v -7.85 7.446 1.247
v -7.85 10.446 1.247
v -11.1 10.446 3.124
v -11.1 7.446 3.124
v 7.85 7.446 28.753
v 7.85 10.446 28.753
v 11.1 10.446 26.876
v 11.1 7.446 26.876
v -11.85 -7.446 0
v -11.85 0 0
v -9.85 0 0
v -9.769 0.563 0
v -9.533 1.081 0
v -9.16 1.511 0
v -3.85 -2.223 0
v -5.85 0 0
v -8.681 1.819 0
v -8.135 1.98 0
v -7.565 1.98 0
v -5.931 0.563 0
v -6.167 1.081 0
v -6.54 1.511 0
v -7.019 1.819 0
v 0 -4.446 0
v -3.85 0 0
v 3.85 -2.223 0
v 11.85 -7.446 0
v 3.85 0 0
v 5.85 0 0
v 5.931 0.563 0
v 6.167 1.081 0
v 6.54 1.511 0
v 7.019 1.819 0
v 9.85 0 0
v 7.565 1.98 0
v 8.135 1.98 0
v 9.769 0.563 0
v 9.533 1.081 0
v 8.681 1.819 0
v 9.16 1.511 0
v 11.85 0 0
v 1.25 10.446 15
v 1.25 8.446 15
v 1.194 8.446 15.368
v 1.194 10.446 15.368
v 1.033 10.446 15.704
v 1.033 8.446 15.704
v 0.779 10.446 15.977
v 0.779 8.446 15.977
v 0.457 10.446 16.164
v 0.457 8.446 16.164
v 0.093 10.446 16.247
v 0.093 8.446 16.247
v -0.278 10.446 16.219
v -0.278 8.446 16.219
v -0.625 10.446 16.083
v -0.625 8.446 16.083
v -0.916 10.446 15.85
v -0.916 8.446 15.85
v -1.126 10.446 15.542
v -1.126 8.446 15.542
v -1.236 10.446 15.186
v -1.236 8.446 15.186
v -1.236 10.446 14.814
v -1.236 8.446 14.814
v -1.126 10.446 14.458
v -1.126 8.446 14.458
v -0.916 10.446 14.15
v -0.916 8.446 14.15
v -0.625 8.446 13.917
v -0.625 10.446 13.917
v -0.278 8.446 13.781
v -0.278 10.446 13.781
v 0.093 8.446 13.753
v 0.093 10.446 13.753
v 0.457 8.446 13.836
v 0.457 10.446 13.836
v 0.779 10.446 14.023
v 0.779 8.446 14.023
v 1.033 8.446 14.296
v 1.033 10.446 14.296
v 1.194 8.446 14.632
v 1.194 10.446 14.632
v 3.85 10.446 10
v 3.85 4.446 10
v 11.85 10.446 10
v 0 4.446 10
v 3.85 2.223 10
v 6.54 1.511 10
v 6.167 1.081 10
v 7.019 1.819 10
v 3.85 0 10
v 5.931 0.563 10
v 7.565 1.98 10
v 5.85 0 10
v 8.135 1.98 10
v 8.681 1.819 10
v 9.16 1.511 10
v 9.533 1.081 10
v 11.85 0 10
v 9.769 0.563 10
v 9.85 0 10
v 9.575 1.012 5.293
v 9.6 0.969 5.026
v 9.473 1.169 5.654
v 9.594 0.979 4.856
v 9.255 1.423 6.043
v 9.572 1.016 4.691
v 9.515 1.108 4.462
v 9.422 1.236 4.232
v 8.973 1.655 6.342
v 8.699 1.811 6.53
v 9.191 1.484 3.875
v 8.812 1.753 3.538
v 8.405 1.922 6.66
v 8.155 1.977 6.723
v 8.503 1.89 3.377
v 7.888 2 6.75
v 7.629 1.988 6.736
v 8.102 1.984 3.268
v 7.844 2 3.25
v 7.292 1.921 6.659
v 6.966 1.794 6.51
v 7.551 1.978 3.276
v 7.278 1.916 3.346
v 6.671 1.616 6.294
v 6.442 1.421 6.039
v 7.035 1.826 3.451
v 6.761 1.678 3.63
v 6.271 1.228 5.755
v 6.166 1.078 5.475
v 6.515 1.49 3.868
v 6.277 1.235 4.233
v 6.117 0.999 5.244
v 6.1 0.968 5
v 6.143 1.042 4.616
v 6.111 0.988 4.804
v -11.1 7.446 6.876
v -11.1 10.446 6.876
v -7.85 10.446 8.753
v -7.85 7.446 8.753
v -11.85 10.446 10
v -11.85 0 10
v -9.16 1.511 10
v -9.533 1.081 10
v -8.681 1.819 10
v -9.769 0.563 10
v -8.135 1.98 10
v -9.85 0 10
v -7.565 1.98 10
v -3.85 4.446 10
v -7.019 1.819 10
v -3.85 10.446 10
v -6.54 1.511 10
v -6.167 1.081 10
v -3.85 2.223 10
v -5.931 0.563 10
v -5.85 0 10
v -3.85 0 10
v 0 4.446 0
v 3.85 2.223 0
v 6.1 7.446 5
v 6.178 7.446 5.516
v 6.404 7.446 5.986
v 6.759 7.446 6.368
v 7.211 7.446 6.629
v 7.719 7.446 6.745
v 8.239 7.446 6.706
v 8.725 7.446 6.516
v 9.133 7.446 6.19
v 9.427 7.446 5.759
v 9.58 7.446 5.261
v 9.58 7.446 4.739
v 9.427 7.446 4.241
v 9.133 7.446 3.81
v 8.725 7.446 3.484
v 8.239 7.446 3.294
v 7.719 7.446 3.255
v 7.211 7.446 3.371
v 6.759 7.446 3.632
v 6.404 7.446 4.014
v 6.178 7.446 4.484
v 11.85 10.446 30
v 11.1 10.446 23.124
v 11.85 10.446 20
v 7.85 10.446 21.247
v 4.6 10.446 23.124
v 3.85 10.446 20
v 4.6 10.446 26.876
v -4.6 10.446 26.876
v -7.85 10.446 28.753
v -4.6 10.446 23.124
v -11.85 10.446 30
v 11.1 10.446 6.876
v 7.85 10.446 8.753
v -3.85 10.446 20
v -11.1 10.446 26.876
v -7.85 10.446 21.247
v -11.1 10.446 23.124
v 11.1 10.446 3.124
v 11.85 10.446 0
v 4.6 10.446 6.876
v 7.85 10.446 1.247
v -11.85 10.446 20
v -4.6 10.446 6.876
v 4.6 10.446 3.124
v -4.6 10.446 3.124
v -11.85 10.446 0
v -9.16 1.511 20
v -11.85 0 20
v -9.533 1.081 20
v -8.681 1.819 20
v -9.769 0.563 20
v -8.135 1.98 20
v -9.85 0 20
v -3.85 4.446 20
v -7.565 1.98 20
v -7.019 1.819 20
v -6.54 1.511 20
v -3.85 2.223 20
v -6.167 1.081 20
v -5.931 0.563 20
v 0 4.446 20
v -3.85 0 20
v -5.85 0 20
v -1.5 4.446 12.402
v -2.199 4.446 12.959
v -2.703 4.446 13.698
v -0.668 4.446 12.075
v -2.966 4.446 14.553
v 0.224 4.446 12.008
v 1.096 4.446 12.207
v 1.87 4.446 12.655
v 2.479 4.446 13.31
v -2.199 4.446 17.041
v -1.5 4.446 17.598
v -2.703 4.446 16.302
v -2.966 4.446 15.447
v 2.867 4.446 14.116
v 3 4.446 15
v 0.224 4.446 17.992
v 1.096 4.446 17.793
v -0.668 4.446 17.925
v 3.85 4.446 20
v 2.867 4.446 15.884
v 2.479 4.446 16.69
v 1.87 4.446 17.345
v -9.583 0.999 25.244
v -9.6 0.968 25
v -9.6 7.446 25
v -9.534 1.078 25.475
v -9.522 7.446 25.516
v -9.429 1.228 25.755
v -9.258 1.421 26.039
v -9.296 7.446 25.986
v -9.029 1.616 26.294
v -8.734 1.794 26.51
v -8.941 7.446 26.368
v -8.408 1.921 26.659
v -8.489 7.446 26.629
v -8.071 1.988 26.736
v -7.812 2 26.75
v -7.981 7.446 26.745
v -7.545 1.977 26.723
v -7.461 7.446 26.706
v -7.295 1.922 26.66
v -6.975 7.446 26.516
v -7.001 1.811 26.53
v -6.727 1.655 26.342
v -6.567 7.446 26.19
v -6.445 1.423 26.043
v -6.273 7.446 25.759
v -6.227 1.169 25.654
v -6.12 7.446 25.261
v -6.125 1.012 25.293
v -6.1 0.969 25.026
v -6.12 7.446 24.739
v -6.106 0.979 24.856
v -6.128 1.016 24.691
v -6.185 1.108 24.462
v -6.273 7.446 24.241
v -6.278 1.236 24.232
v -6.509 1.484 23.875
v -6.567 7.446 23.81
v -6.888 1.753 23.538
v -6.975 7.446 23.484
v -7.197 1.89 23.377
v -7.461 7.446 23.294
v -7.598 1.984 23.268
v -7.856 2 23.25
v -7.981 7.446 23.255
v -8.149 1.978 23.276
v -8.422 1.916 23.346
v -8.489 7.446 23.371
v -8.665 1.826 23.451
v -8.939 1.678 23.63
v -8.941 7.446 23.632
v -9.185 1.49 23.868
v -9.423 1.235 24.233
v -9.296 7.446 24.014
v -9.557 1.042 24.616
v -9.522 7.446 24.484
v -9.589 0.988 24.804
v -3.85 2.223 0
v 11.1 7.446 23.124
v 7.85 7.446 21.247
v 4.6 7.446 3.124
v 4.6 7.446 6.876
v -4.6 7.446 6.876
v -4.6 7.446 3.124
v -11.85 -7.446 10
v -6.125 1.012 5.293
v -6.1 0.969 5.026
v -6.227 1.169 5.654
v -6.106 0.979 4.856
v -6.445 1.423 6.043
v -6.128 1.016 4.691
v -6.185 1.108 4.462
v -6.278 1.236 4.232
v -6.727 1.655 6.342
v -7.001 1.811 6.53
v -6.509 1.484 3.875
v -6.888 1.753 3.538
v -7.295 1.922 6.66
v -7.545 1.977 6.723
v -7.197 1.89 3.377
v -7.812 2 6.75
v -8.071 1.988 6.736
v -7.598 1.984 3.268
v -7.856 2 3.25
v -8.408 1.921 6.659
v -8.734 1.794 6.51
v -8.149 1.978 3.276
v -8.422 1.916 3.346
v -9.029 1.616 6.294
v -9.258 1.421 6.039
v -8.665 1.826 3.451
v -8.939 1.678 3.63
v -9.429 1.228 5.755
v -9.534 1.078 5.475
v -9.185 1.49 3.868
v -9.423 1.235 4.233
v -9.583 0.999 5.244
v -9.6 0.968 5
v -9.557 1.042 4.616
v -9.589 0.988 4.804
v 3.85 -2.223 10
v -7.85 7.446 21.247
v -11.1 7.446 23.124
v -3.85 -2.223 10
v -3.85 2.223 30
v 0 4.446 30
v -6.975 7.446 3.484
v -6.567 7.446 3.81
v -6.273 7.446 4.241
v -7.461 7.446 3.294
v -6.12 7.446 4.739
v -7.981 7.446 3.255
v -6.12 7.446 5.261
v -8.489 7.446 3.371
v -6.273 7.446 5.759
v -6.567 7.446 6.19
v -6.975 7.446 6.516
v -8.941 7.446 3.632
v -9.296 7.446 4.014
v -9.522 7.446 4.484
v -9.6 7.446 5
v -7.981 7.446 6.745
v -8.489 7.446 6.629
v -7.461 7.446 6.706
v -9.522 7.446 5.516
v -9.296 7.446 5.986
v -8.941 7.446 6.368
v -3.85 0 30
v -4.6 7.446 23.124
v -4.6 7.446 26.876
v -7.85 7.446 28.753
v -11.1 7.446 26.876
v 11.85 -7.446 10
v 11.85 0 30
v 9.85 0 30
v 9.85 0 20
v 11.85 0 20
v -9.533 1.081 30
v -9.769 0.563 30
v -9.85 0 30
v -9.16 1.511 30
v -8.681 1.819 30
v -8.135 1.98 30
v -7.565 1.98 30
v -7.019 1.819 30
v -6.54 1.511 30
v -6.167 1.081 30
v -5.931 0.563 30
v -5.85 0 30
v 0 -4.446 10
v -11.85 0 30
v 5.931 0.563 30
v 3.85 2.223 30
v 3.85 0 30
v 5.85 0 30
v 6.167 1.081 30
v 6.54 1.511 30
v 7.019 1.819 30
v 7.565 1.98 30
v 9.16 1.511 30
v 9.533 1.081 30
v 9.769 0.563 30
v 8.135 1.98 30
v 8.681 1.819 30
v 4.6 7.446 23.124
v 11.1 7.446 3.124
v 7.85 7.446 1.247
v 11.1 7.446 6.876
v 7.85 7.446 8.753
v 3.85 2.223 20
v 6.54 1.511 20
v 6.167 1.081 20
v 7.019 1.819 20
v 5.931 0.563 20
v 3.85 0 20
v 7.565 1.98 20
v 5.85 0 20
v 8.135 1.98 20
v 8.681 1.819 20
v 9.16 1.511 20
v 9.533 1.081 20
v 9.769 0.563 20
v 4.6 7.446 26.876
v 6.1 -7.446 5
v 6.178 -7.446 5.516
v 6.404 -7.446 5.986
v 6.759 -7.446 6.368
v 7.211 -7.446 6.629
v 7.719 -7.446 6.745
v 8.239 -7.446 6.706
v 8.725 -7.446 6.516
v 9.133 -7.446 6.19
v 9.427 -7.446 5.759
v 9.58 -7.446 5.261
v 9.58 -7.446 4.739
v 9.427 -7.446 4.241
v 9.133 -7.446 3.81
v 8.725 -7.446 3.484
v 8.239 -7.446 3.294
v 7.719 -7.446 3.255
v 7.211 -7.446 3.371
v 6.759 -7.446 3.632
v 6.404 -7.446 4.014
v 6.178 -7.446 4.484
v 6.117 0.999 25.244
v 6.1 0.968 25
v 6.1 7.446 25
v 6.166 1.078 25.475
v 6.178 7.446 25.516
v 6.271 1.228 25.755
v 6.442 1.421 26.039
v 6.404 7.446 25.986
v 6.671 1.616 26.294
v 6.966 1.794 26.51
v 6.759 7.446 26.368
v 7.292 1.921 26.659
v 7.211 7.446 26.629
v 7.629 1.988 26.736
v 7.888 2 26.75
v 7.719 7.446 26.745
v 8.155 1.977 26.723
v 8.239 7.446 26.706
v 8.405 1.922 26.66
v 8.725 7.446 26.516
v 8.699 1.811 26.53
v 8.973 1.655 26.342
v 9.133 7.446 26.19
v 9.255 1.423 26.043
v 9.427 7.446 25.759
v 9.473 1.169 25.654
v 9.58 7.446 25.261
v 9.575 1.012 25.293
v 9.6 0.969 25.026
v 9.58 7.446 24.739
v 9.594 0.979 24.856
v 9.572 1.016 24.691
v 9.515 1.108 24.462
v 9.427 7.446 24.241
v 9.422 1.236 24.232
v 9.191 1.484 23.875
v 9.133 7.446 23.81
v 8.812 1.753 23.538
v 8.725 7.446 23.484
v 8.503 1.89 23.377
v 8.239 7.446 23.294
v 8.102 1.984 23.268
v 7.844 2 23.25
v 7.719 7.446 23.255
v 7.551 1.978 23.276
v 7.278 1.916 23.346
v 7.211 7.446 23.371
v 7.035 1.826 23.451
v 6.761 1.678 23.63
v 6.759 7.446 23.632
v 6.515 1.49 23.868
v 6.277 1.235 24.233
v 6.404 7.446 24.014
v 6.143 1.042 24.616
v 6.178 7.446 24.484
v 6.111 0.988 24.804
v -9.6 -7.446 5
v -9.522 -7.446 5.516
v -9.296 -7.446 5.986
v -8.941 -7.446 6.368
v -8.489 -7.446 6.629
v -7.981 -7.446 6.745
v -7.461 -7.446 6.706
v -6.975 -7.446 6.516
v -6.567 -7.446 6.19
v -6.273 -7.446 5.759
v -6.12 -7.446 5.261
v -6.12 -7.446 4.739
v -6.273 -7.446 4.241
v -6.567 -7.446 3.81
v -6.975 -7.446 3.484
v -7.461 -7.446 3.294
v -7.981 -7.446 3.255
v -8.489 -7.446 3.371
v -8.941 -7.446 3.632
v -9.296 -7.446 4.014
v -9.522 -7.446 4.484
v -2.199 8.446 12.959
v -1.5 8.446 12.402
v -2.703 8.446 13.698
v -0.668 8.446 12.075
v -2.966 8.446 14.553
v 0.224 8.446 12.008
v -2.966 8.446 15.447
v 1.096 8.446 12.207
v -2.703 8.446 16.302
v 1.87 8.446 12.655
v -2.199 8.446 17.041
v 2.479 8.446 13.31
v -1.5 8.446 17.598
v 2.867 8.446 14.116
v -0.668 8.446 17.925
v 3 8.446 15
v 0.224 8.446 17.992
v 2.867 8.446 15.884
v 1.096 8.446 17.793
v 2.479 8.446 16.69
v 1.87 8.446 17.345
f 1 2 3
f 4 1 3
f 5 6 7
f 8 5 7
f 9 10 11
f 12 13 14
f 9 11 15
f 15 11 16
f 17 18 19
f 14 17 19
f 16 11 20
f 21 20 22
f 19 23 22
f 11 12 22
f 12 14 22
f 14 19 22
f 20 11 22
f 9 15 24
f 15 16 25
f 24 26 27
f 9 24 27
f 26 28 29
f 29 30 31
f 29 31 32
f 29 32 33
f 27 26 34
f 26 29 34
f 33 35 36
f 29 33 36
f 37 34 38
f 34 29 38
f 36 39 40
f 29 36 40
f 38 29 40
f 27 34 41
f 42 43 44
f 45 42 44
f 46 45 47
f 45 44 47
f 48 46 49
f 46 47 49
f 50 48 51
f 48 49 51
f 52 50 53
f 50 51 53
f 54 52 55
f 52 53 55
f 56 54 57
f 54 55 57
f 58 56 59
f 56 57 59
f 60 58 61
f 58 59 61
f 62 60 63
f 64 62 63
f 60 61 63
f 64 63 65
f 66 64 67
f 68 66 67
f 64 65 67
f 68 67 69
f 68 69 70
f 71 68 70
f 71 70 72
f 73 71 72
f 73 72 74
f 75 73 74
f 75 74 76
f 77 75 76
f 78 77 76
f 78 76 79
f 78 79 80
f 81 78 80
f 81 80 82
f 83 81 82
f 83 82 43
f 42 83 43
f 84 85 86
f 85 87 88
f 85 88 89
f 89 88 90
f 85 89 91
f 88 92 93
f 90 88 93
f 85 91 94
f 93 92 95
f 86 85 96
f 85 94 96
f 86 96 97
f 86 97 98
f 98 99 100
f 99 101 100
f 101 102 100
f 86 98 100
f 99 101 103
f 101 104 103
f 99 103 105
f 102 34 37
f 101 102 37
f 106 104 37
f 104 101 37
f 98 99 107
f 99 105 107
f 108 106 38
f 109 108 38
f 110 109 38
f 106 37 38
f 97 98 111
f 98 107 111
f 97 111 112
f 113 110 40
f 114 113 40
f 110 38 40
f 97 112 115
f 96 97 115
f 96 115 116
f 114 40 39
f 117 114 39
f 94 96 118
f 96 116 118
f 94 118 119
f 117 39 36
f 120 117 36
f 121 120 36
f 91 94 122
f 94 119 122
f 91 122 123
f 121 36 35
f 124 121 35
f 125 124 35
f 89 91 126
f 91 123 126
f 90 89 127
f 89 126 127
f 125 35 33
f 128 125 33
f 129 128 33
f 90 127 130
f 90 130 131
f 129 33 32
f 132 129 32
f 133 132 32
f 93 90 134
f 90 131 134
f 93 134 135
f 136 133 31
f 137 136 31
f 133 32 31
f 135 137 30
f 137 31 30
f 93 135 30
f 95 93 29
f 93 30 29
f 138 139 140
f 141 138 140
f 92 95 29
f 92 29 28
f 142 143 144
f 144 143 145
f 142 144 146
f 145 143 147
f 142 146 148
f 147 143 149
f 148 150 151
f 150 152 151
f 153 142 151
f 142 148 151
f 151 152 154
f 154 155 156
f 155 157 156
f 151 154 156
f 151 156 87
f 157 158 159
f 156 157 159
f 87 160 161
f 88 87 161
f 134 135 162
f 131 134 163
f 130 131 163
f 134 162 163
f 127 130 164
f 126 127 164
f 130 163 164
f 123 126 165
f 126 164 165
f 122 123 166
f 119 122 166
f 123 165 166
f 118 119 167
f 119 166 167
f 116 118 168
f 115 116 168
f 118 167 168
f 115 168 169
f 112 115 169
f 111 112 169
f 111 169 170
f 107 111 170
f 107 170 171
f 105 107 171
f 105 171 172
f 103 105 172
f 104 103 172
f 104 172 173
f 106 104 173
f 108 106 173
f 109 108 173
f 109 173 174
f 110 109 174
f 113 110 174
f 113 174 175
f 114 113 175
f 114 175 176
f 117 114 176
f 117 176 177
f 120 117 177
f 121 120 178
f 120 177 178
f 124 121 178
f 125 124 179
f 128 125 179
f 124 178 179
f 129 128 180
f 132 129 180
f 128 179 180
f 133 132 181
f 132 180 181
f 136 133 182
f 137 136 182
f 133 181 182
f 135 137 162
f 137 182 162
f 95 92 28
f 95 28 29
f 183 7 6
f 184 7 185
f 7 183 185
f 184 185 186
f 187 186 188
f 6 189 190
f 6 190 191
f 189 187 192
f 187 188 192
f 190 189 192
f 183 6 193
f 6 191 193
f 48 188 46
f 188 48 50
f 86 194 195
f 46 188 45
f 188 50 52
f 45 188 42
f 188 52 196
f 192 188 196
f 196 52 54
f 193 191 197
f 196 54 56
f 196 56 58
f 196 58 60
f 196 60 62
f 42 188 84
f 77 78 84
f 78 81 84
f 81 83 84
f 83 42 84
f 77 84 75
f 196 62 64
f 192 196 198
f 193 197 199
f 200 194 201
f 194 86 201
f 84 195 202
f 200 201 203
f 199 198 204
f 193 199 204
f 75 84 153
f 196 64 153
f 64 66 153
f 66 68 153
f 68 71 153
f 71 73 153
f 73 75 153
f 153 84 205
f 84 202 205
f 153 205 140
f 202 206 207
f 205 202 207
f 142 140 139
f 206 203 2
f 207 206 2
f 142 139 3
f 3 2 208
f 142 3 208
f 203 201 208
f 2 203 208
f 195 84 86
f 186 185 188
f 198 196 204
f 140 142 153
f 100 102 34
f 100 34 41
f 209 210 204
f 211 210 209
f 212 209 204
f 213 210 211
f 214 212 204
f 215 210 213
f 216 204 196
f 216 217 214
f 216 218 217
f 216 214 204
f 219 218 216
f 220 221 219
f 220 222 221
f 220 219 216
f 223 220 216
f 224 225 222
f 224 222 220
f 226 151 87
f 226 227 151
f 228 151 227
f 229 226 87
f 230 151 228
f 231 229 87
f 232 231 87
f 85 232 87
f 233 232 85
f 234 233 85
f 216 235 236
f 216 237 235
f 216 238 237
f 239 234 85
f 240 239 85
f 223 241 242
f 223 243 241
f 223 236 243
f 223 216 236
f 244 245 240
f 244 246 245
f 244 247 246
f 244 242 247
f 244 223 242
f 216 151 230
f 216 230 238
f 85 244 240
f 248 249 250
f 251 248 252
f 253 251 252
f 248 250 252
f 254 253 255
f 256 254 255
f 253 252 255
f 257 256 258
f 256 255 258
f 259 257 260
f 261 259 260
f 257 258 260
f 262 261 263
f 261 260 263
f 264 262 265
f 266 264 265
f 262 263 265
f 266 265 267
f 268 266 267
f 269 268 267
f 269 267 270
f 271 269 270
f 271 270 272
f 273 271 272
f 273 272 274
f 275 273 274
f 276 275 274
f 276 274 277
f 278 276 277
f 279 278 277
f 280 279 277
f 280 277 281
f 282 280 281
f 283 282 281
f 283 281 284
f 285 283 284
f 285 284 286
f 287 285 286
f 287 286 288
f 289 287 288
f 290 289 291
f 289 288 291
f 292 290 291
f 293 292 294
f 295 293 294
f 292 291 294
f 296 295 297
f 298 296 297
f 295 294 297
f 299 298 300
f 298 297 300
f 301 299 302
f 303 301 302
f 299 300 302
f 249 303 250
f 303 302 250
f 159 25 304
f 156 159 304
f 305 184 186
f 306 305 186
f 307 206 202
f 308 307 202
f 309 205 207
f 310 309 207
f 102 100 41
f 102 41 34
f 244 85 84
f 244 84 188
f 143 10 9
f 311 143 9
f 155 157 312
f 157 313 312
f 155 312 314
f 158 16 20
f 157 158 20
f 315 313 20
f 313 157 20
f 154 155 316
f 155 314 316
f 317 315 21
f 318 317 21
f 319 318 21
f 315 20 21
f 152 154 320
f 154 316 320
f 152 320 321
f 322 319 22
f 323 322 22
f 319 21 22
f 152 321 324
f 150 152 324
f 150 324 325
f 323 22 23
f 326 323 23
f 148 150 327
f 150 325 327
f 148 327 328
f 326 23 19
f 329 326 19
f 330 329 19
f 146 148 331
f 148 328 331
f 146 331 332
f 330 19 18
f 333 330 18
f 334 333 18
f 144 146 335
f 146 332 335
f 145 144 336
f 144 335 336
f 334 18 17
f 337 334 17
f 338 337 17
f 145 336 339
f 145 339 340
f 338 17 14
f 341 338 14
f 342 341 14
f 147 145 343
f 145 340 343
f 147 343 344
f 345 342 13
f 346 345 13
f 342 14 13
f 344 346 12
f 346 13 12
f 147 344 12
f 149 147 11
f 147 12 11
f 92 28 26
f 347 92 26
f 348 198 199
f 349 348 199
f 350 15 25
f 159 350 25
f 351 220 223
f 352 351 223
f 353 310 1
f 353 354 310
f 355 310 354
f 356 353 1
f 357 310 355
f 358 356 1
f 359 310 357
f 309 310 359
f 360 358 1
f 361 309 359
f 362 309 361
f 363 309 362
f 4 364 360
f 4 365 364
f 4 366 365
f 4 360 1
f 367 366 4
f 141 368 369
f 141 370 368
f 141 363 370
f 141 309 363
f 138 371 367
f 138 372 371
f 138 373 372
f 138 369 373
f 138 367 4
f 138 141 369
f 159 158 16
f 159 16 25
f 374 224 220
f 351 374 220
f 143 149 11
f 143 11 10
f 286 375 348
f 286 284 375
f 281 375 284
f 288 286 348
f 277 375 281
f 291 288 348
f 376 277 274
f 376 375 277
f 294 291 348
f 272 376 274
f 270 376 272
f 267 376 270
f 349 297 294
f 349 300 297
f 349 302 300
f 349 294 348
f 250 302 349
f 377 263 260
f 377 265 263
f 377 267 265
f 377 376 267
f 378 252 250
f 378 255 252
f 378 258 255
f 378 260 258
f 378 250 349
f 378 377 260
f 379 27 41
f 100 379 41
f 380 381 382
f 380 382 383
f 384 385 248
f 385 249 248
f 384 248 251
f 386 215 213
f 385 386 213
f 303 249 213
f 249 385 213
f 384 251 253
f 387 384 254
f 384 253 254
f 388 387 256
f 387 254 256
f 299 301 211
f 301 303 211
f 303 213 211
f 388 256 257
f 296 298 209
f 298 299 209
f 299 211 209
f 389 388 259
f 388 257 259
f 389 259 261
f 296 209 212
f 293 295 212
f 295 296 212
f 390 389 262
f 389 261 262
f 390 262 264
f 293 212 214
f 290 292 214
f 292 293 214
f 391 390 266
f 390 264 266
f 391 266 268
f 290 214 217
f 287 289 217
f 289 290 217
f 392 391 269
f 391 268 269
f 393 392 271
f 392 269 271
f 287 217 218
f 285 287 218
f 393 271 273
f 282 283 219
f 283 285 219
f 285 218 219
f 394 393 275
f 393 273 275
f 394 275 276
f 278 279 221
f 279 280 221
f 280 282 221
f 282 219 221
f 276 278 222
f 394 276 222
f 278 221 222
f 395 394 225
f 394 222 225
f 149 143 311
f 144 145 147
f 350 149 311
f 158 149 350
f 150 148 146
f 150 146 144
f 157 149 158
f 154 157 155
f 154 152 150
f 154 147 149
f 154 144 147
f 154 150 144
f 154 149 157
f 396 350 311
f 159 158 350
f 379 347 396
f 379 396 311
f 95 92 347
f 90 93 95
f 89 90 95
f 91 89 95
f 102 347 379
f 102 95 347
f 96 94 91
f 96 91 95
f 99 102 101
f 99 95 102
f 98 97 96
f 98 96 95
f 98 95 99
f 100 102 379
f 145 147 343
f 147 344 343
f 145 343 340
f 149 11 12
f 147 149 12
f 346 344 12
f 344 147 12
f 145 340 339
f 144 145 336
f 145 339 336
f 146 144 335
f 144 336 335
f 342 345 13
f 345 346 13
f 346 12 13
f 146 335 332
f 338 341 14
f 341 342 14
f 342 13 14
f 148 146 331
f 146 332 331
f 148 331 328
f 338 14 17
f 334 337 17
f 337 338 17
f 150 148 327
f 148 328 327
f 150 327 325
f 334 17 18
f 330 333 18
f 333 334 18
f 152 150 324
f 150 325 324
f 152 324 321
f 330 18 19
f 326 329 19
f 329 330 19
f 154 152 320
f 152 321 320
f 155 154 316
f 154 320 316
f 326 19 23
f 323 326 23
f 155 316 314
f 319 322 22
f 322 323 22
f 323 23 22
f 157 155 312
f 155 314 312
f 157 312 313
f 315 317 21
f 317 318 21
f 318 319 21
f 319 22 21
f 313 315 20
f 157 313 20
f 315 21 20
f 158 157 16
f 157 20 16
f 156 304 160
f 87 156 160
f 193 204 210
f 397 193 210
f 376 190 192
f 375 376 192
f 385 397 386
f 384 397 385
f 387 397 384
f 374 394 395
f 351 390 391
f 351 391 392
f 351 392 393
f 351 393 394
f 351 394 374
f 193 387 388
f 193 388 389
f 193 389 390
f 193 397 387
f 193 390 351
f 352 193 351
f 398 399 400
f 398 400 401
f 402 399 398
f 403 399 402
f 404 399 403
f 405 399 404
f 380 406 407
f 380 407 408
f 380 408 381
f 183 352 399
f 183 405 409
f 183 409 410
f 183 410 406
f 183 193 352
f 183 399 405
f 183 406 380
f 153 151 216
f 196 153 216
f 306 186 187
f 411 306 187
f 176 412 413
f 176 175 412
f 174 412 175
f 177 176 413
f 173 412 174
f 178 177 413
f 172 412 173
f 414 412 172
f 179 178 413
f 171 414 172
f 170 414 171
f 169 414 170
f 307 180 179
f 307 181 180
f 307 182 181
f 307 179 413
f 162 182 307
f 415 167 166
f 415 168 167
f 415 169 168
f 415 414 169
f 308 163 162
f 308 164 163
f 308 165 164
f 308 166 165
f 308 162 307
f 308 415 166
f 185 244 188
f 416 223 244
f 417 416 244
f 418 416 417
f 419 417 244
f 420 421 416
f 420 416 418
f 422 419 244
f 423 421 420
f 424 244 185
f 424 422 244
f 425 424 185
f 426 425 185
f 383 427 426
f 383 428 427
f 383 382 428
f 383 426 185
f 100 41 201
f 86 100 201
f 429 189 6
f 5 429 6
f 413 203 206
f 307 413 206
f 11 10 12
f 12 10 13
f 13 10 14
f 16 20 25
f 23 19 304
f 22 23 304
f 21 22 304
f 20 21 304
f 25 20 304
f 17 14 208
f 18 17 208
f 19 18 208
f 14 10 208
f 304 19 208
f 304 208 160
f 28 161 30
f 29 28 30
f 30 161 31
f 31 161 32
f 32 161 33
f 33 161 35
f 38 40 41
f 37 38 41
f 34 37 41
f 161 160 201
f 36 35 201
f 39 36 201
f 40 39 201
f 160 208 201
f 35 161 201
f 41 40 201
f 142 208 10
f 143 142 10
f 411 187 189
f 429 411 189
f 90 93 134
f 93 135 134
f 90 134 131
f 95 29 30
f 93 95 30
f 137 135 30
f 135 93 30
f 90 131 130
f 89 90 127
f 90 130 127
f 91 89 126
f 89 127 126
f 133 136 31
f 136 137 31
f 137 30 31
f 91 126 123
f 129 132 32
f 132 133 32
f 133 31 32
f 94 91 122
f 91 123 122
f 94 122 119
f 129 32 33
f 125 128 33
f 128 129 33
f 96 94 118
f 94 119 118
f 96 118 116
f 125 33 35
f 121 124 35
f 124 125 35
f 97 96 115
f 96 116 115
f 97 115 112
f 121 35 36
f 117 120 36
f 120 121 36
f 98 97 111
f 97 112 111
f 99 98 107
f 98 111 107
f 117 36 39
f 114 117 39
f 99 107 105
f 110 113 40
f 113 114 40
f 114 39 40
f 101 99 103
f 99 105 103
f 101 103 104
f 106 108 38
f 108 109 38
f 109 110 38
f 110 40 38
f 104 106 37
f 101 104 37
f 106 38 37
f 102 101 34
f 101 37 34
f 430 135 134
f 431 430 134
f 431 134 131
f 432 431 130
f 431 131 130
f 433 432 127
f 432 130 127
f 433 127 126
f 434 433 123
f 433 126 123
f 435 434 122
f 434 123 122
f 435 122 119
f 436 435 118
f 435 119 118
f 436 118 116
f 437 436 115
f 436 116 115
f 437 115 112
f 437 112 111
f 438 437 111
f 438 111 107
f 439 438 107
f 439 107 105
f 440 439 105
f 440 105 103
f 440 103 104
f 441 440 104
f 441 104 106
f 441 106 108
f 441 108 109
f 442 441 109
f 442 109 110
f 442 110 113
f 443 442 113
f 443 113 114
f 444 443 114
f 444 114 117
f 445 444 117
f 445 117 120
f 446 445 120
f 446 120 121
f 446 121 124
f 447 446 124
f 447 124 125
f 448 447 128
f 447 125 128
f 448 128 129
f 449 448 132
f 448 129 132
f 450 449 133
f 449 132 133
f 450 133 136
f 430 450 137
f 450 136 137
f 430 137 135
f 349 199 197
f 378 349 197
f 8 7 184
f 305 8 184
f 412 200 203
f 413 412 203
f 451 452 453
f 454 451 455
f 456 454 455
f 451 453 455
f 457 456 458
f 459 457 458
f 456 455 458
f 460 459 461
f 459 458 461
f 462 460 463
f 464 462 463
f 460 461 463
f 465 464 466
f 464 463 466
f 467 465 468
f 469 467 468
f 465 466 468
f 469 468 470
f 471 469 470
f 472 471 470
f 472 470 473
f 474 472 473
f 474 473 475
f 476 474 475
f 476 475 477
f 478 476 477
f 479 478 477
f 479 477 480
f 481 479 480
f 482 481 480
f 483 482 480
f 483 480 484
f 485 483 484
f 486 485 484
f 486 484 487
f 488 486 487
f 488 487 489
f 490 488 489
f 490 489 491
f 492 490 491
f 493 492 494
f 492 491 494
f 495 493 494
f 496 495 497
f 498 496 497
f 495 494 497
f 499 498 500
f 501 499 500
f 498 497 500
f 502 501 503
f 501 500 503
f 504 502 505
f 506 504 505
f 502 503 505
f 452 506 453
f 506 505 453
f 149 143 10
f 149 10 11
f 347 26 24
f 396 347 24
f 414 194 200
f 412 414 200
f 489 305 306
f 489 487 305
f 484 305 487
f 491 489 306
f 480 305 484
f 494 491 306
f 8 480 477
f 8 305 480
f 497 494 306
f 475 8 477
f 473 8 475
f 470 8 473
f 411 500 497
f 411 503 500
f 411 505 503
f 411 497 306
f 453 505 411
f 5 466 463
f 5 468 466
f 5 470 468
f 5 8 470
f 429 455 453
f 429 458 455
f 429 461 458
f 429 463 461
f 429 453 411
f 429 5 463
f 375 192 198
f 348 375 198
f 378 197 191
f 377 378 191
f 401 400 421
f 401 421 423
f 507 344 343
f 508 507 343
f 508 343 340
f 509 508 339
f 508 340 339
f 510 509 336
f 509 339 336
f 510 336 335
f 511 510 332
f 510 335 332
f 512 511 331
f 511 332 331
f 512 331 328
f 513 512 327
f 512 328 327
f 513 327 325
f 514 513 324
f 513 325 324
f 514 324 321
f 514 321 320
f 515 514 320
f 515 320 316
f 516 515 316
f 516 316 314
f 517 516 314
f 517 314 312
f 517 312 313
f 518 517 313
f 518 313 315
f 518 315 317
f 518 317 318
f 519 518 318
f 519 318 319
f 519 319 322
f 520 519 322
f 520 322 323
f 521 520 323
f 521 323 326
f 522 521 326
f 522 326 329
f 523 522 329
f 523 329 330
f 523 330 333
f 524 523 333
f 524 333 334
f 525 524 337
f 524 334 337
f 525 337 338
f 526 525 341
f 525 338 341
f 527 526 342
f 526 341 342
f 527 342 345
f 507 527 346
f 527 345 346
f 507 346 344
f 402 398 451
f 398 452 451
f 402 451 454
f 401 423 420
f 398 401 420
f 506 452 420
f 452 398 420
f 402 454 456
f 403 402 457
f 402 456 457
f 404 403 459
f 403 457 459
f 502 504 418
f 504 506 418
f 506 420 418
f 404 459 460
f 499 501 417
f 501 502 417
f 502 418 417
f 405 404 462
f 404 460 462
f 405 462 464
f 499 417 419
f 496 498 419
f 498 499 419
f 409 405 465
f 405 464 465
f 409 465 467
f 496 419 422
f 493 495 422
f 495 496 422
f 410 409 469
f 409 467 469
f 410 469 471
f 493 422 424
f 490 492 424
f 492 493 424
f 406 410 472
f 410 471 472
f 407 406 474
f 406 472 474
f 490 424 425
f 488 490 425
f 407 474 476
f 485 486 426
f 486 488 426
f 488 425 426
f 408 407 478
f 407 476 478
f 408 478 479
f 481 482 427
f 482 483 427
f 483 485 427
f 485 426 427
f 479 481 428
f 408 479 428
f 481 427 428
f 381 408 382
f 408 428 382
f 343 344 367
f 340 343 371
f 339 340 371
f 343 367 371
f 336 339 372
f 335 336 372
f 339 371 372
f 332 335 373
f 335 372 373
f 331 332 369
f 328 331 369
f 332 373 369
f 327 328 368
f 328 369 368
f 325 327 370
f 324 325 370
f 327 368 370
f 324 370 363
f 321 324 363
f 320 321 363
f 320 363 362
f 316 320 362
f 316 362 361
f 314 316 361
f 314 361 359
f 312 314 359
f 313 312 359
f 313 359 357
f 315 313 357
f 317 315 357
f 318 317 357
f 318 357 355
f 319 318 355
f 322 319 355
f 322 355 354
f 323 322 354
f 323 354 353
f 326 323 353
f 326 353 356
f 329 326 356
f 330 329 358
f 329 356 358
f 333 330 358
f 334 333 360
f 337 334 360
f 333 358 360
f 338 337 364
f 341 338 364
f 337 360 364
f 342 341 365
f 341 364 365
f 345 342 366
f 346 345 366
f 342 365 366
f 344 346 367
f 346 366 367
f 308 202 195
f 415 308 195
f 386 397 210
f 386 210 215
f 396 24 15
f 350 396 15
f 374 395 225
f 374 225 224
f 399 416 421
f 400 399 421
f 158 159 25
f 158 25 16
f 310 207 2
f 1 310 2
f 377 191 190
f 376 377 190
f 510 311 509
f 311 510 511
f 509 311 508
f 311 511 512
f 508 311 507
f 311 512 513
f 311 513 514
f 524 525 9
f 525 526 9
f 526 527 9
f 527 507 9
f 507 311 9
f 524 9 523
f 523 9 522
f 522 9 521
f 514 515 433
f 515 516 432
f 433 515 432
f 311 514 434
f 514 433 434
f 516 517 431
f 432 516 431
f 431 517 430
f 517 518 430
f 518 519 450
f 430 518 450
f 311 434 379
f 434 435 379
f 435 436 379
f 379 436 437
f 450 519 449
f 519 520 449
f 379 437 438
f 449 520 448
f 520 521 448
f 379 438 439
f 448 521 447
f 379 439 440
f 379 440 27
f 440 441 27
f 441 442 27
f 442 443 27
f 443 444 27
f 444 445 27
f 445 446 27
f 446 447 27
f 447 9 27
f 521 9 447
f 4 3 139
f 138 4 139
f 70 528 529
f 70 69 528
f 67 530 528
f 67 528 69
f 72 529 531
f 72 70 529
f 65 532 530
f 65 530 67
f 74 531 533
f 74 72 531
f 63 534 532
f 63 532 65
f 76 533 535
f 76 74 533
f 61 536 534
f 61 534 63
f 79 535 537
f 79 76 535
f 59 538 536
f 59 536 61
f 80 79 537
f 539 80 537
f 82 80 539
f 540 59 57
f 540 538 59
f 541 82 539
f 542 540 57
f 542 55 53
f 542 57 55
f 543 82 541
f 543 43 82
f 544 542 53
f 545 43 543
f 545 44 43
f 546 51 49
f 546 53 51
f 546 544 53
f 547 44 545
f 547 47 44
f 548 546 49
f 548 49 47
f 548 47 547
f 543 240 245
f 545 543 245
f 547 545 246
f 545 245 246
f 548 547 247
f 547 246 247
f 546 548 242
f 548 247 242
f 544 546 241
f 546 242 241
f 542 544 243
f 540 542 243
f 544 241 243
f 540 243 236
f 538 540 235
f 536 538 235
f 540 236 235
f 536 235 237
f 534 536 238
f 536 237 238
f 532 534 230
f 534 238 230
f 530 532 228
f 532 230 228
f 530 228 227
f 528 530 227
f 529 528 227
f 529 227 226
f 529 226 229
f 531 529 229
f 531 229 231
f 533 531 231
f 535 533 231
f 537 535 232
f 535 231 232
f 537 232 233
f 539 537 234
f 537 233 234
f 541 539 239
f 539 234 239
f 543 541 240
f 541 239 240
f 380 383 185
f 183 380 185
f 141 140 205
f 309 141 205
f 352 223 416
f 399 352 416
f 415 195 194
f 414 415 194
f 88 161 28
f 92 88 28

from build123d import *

# Parameters (mm, degrees)
F1_DEPTH  = 30
F2_W      = 8
F2_H      = 10
F3_DEPTH  = 10.4455970728
F4_W      = 7.7
F4_H      = 10
F5_DEPTH  = 4.4455970728
F6_R      = 1.25
F7_DEPTH  = 6
F8_R      = 3
F9_DEPTH  = 4
F11_DEPTH = 3
F13_DEPTH = 10
F12_R     = 1.75
F14_DEPTH = 17.8911941455


with BuildPart() as f1:
    # F0 (on Top) → F1 (new body)
    with BuildSketch(Plane.XY):
        with BuildLine():
            Line((0, 4.4455970728), (3.85, 2.2227985364))
            Line((3.85, 2.2227985364), (3.85, 0))
            Line((3.85, 0), (5.85, 0))
            ThreePointArc((5.85, 0), (7.85, 2), (9.85, 0))
            Line((9.85, 0), (11.85, 0))
            Line((11.85, 0), (11.85, 10.4455970728))
            Line((11.85, 10.4455970728), (0, 10.4455970728))
            Line((0, 10.4455970728), (-11.85, 10.4455970728))
            Line((-11.85, 10.4455970728), (-11.85, 0))
            Line((-11.85, 0), (-9.85, 0))
            ThreePointArc((-9.85, 0), (-7.85, 2), (-5.85, 0))
            Line((-5.85, 0), (-3.85, 0))
            Line((-3.85, 0), (-3.85, 2.2227985364))
            Line((-3.85, 2.2227985364), (0, 4.4455970728))
        make_face()
    extrude(amount=F1_DEPTH)

    # F2 (on face) → F3 (cut, through all)
    with BuildSketch(Plane.XZ):
        with Locations((-7.85, 15)):
            Rectangle(F2_W, F2_H)
        with Locations((7.85, 15)):
            Rectangle(F2_W, F2_H)
    extrude(amount=-F3_DEPTH, mode=Mode.SUBTRACT)

    # F4 (on face) → F5 (cut, through all)
    with BuildSketch(Plane.XZ):
        with Locations((0, 15)):
            Rectangle(F4_W, F4_H)
    extrude(amount=-F5_DEPTH, mode=Mode.SUBTRACT)

    # F6 (on face) → F7 (cut, through all)
    with BuildSketch(Plane.XZ.offset(-4.4455970728)):
        with Locations((0, 15)):
            Circle(F6_R)
    extrude(amount=-F7_DEPTH, mode=Mode.SUBTRACT)

    # F8 (on face) → F9 (cut)
    with BuildSketch(Plane.XZ.offset(-4.4455970728)):
        with Locations((0, 15)):
            Circle(F8_R)
    extrude(amount=-F9_DEPTH, mode=Mode.SUBTRACT)

    # F10 (on face) → F11 (cut)
    with BuildSketch(Plane(origin=(0, 10.4455970728, 0), x_dir=(-1, 0, 0), z_dir=(0, 1, 0))):
        Polygon((-4.6, 23.1236116251), (-4.6, 26.8763883749), (-7.85, 28.7527767497), (-11.1, 26.8763883749), (-11.1, 23.1236116251), (-7.85, 21.2472232503), align=None)
        Polygon((11.1, 23.1236116251), (11.1, 26.8763883749), (7.85, 28.7527767497), (4.6, 26.8763883749), (4.6, 23.1236116251), (7.85, 21.2472232503), align=None)
        Polygon((11.1, 3.1236116251), (11.1, 6.8763883749), (7.85, 8.7527767497), (4.6, 6.8763883749), (4.6, 3.1236116251), (7.85, 1.2472232503), align=None)
        Polygon((-4.6, 6.8763883749), (-7.85, 8.7527767497), (-11.1, 6.8763883749), (-11.1, 3.1236116251), (-7.85, 1.2472232503), (-4.6, 3.1236116251), align=None)
    extrude(amount=-F11_DEPTH, mode=Mode.SUBTRACT)


with BuildPart() as f13:
    # F0 (on Top) → F13 (new body, through all)
    with BuildSketch(Plane.XY):
        with BuildLine():
            Line((5.85, 0), (3.85, 0))
            Line((3.85, 0), (3.85, -2.2227985364))
            Line((3.85, -2.2227985364), (0, -4.4455970728))
            Line((0, -4.4455970728), (-3.85, -2.2227985364))
            Line((-3.85, -2.2227985364), (-3.85, 0))
            Line((-3.85, 0), (-5.85, 0))
            ThreePointArc((-5.85, 0), (-7.85, 2), (-9.85, 0))
            Line((-9.85, 0), (-11.85, 0))
            Line((-11.85, 0), (-11.85, -7.4455970728))
            Line((-11.85, -7.4455970728), (0, -7.4455970728))
            Line((0, -7.4455970728), (11.85, -7.4455970728))
            Line((11.85, -7.4455970728), (11.85, 0))
            Line((11.85, 0), (9.85, 0))
            ThreePointArc((9.85, 0), (7.85, 2), (5.85, 0))
        make_face()
    extrude(amount=F13_DEPTH)


with BuildPart() as f14_tool:
    # F12 (on face) → F14 (new body, through all)
    with BuildSketch(Plane(origin=(0, 10.4455970728, 0), x_dir=(-1, 0, 0), z_dir=(0, 1, 0))):
        with Locations((-7.85, 25)):
            Circle(F12_R)
        with Locations((7.85, 25)):
            Circle(F12_R)
        with Locations((7.85, 5)):
            Circle(F12_R)
        with Locations((-7.85, 5)):
            Circle(F12_R)
    extrude(amount=-F14_DEPTH)


with BuildPart() as f1_1:
    add(f1.part)

    # F14: cut by f14_tool
    add(f14_tool.part, mode=Mode.SUBTRACT)


with BuildPart() as f13_1:
    add(f13.part)

    # F14: cut by f14_tool
    add(f14_tool.part, mode=Mode.SUBTRACT)


solid = Compound([f1_1.part, f13_1.part])
